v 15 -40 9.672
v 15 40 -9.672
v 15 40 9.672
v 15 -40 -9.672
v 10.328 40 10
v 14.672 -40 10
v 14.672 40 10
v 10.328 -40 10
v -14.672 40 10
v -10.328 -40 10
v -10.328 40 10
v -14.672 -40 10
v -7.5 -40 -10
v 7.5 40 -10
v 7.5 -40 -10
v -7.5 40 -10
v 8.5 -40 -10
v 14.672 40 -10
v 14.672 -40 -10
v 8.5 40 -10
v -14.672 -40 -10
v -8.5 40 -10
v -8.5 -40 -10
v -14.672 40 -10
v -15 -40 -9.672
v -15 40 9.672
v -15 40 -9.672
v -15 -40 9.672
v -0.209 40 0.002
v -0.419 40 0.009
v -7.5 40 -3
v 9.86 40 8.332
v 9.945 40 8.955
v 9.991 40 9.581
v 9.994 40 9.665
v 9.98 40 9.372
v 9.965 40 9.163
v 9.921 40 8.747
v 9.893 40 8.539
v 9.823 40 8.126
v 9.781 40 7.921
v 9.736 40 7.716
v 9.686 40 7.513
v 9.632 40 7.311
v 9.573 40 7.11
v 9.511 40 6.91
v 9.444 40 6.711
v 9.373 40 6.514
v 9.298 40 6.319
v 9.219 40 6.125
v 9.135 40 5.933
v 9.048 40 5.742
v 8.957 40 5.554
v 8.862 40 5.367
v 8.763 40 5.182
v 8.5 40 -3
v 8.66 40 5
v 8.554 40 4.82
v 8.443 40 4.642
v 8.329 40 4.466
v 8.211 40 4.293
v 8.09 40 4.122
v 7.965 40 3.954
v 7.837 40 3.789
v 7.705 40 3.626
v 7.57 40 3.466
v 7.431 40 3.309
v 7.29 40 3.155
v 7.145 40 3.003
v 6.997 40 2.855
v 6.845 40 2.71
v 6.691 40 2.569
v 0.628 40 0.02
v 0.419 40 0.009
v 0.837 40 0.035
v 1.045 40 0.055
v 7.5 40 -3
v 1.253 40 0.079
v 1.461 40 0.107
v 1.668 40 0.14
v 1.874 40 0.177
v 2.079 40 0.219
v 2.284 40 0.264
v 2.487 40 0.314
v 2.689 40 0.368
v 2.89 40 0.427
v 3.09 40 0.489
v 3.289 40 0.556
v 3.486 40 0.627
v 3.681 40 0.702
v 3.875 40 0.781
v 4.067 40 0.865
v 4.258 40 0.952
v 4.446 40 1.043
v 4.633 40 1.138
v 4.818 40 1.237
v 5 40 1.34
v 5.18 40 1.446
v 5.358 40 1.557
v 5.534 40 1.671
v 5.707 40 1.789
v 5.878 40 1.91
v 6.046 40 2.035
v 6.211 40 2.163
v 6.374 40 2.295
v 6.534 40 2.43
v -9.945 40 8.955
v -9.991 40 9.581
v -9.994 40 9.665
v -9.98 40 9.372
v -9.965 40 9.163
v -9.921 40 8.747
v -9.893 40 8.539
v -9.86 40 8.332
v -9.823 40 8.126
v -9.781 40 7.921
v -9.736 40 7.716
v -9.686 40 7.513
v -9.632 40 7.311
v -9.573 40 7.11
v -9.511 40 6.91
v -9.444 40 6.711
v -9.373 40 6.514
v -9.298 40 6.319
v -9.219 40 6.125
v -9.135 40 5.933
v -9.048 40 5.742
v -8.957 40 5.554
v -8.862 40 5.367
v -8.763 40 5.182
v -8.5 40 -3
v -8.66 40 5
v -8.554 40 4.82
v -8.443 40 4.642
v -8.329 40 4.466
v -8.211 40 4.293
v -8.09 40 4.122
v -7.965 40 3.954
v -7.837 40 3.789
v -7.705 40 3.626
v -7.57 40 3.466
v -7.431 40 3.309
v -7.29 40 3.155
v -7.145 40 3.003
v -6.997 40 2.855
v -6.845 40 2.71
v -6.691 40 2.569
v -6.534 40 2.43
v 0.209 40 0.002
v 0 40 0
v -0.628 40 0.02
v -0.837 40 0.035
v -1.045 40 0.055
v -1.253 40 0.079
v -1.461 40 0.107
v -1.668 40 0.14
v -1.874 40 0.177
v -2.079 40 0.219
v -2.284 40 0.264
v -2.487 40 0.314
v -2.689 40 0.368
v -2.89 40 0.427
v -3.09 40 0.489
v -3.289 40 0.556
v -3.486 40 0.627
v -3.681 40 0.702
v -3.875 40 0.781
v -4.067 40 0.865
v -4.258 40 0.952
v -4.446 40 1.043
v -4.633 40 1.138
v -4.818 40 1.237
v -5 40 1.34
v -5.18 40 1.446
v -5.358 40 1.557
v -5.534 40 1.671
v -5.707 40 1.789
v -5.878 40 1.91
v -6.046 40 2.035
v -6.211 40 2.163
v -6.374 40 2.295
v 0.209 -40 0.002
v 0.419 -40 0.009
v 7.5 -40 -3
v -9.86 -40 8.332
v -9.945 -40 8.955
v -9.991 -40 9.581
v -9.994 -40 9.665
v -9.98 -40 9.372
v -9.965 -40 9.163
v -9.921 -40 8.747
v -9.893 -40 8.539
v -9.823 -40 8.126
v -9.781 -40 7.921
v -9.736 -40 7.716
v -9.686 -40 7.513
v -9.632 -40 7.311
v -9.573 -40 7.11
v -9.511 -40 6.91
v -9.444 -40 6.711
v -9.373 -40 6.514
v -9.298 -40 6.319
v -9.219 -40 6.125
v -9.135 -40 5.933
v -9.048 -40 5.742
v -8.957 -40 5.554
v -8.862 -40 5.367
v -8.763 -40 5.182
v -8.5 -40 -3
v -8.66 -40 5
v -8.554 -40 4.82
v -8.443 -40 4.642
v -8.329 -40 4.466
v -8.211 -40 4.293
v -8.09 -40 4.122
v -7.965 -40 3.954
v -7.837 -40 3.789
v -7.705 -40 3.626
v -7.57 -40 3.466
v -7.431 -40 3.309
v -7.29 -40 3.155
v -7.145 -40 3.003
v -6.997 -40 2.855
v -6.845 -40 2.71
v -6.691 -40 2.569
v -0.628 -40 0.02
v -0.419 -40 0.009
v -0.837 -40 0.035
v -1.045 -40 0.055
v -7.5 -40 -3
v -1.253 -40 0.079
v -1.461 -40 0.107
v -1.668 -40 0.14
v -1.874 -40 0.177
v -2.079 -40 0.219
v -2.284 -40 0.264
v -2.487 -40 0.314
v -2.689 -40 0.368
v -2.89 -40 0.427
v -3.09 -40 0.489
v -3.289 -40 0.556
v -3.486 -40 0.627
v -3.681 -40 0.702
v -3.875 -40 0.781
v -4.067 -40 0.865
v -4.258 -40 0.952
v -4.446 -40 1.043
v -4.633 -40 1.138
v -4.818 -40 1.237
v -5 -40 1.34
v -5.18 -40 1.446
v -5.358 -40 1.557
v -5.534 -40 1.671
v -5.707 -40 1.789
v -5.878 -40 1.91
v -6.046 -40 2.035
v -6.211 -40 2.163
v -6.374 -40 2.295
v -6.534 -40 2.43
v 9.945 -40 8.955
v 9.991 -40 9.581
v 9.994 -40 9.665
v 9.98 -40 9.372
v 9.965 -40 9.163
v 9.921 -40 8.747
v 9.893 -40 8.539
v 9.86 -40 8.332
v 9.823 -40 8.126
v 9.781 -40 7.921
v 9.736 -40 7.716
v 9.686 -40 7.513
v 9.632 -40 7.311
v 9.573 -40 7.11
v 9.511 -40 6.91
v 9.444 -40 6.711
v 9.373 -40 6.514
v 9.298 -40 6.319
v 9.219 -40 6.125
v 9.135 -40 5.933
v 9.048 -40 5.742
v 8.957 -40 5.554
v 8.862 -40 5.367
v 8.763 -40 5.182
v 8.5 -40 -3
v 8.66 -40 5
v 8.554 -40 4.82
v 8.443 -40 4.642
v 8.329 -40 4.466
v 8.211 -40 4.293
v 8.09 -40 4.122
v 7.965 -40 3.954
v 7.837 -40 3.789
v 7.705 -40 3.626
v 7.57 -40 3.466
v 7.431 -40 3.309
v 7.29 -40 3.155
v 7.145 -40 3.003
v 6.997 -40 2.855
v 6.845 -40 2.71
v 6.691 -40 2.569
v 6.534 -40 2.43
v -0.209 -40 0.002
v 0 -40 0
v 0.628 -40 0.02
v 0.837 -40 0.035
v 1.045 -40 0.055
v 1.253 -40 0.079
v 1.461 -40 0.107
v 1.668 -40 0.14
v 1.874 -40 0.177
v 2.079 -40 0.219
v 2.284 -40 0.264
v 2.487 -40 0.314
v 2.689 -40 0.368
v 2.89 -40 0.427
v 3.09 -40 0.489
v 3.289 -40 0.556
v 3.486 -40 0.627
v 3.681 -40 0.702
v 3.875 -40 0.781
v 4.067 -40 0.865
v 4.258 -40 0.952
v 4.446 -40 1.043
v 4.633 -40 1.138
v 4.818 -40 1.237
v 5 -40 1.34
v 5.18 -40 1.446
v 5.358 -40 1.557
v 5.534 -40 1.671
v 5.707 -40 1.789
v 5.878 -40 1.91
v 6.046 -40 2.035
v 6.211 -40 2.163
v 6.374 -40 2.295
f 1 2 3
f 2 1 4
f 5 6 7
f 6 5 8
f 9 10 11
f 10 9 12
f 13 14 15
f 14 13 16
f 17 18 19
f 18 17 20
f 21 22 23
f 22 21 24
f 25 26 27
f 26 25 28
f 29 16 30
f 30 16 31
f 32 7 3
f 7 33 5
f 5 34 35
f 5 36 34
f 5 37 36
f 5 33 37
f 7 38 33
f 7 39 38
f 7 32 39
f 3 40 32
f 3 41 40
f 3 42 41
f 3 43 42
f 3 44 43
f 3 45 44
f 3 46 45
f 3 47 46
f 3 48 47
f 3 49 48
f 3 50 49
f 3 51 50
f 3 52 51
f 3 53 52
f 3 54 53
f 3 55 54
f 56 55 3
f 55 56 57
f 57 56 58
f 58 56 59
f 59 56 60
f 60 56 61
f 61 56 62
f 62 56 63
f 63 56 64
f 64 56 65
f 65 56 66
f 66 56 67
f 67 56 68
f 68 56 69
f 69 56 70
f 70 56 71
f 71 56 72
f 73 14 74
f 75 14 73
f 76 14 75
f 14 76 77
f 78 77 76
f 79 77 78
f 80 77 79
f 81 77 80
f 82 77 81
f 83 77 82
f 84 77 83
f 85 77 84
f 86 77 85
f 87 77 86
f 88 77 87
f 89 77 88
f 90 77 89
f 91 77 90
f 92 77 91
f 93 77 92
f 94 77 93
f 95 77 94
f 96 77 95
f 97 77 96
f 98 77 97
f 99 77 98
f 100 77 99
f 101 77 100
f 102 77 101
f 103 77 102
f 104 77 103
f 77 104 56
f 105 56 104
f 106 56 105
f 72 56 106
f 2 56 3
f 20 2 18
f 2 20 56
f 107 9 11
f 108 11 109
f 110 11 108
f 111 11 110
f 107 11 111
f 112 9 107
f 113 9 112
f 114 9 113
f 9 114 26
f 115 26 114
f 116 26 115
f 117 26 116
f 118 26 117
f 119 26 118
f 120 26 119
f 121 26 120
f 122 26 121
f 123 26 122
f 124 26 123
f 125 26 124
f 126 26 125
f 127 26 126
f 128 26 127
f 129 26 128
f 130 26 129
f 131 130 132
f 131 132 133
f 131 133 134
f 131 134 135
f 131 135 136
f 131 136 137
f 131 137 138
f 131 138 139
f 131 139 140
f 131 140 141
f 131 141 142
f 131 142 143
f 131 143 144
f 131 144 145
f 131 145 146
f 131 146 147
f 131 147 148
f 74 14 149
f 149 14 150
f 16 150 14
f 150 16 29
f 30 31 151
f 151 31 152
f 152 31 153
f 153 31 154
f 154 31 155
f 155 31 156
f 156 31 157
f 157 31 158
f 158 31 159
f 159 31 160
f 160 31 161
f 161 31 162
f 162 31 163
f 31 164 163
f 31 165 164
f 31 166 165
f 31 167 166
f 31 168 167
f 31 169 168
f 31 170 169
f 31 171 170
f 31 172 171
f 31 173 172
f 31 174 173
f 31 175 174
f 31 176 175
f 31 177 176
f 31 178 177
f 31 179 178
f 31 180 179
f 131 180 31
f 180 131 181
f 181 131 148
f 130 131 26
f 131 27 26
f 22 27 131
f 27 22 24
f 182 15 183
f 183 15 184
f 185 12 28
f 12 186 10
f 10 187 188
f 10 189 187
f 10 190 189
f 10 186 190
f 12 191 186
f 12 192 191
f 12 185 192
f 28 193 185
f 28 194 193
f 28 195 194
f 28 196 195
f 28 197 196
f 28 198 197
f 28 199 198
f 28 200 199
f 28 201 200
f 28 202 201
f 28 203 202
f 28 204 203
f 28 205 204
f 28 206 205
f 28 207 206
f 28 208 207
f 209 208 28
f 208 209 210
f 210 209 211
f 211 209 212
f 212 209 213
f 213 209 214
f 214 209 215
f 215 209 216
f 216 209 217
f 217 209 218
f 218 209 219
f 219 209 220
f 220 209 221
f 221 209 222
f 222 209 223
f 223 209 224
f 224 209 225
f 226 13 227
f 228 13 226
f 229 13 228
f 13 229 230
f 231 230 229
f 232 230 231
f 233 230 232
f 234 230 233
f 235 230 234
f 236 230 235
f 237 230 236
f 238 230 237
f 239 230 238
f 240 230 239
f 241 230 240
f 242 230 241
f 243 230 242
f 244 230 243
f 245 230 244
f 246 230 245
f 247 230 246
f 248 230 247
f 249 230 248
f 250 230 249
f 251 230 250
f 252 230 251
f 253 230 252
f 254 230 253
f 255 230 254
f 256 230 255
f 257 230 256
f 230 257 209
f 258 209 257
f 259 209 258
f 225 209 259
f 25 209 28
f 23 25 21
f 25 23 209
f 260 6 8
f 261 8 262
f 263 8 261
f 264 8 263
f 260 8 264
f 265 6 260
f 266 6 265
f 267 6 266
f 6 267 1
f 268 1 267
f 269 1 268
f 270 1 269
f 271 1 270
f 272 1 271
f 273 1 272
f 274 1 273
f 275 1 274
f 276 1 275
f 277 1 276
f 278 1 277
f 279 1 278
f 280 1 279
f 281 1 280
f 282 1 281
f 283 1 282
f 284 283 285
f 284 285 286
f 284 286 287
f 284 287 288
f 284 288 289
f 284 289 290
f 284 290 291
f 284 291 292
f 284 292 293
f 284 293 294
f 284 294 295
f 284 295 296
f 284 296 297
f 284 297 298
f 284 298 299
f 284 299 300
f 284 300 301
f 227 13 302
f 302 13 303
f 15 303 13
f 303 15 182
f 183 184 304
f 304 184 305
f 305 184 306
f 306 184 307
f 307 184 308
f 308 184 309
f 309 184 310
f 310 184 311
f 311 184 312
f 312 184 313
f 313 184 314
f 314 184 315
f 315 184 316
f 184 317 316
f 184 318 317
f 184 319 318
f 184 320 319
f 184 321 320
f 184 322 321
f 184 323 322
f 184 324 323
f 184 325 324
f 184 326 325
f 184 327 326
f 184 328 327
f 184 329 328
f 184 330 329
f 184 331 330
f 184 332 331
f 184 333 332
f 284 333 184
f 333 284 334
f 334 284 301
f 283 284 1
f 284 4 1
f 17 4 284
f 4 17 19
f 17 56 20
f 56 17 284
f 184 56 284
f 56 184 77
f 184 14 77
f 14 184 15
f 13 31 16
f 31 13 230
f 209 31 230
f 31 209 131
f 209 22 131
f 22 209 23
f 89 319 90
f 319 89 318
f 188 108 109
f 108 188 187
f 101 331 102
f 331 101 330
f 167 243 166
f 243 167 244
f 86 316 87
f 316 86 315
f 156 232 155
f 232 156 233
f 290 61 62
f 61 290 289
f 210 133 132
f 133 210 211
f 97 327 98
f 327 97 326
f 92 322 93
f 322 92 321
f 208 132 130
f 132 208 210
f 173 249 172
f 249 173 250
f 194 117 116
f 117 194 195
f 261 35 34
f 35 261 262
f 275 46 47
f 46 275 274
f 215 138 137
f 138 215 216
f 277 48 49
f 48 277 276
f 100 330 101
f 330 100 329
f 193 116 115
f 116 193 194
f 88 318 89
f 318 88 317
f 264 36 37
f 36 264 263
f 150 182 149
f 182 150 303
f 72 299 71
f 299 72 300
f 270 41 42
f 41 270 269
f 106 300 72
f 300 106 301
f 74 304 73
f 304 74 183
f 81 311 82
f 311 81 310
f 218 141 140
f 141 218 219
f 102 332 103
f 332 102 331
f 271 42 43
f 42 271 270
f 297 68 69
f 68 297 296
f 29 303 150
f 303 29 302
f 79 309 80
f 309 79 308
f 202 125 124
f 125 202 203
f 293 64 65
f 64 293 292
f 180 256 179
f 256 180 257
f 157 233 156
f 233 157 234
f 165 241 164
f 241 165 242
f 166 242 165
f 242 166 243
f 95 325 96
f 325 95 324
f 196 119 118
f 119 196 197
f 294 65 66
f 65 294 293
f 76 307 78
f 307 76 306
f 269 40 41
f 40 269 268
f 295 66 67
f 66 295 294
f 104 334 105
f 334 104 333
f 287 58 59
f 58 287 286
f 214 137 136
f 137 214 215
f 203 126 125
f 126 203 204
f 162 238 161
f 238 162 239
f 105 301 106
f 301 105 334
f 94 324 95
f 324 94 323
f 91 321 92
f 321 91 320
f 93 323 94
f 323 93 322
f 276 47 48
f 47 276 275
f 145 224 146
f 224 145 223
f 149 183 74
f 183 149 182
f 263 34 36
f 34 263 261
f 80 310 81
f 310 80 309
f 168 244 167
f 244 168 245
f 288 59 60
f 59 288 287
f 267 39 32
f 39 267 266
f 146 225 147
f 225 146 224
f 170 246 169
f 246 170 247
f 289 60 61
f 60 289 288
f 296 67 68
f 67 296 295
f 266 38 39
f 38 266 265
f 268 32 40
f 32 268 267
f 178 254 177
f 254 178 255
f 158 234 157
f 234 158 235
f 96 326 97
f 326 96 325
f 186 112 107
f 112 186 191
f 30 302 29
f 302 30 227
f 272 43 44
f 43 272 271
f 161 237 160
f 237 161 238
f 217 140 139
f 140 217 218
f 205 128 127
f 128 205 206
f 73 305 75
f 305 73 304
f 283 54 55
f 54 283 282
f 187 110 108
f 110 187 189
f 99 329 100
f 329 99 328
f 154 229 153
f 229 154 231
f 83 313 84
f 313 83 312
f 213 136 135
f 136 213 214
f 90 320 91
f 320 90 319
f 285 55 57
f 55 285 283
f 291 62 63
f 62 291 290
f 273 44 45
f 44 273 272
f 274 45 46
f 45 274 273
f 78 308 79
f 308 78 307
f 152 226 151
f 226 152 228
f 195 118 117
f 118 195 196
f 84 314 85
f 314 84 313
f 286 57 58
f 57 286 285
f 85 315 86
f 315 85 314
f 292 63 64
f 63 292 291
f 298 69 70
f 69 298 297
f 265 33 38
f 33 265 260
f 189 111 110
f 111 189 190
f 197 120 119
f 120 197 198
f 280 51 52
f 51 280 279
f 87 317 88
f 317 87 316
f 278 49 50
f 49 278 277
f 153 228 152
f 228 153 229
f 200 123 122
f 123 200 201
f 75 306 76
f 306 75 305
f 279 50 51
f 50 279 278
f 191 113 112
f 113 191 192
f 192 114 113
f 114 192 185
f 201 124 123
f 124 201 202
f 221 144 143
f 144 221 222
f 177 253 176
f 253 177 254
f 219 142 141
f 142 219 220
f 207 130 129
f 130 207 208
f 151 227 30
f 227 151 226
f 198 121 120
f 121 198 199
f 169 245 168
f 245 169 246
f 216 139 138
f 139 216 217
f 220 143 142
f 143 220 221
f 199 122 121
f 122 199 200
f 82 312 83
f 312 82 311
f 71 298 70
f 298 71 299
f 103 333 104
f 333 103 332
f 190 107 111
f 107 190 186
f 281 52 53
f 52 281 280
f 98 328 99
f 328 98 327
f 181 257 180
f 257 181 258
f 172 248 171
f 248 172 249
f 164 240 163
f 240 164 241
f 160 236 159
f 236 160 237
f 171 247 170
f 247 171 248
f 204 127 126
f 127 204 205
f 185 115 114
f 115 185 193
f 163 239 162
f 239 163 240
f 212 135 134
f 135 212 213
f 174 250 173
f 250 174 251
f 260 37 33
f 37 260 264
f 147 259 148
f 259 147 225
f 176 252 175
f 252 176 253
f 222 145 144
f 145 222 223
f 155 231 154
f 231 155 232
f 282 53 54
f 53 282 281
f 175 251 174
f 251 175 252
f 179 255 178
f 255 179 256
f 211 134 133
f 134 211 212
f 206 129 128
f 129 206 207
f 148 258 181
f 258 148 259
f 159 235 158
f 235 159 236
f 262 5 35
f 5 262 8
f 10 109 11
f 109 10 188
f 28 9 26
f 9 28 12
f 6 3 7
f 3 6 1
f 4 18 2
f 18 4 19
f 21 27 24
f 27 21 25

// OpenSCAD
$fn=300;
difference() {
  cube(size=[30, 80, 20], center=true);
  translate([8,0,-8]) cube(size=[1, 90, 10], center=true);
  translate([-8,0,-8]) cube(size=[1, 90, 10], center=true);
  translate([0,0,10]) rotate([90,0,0]) cylinder(r=10, h=90, center=true);
  translate([10,0,12.5]) rotate([0,45,0]) cube(size=[4, 90, 10], center=true);
  translate([-10,0,12.5]) rotate([0,-45,0]) cube(size=[4, 90, 10], center=true);
  translate([-16,0,11.5]) rotate([0,45,0]) cube(size=[4, 90, 10], center=true);
  translate([16,0, 11.5]) rotate([0,-45,0]) cube(size=[4, 90, 10], center=true);
  translate([ 16,0,-11.5]) rotate([0,45,0]) cube(size=[4, 90, 10], center=true);
  translate([-16,0,-11.5]) rotate([0,-45,0]) cube(size=[4, 90, 10], center=true);
}
